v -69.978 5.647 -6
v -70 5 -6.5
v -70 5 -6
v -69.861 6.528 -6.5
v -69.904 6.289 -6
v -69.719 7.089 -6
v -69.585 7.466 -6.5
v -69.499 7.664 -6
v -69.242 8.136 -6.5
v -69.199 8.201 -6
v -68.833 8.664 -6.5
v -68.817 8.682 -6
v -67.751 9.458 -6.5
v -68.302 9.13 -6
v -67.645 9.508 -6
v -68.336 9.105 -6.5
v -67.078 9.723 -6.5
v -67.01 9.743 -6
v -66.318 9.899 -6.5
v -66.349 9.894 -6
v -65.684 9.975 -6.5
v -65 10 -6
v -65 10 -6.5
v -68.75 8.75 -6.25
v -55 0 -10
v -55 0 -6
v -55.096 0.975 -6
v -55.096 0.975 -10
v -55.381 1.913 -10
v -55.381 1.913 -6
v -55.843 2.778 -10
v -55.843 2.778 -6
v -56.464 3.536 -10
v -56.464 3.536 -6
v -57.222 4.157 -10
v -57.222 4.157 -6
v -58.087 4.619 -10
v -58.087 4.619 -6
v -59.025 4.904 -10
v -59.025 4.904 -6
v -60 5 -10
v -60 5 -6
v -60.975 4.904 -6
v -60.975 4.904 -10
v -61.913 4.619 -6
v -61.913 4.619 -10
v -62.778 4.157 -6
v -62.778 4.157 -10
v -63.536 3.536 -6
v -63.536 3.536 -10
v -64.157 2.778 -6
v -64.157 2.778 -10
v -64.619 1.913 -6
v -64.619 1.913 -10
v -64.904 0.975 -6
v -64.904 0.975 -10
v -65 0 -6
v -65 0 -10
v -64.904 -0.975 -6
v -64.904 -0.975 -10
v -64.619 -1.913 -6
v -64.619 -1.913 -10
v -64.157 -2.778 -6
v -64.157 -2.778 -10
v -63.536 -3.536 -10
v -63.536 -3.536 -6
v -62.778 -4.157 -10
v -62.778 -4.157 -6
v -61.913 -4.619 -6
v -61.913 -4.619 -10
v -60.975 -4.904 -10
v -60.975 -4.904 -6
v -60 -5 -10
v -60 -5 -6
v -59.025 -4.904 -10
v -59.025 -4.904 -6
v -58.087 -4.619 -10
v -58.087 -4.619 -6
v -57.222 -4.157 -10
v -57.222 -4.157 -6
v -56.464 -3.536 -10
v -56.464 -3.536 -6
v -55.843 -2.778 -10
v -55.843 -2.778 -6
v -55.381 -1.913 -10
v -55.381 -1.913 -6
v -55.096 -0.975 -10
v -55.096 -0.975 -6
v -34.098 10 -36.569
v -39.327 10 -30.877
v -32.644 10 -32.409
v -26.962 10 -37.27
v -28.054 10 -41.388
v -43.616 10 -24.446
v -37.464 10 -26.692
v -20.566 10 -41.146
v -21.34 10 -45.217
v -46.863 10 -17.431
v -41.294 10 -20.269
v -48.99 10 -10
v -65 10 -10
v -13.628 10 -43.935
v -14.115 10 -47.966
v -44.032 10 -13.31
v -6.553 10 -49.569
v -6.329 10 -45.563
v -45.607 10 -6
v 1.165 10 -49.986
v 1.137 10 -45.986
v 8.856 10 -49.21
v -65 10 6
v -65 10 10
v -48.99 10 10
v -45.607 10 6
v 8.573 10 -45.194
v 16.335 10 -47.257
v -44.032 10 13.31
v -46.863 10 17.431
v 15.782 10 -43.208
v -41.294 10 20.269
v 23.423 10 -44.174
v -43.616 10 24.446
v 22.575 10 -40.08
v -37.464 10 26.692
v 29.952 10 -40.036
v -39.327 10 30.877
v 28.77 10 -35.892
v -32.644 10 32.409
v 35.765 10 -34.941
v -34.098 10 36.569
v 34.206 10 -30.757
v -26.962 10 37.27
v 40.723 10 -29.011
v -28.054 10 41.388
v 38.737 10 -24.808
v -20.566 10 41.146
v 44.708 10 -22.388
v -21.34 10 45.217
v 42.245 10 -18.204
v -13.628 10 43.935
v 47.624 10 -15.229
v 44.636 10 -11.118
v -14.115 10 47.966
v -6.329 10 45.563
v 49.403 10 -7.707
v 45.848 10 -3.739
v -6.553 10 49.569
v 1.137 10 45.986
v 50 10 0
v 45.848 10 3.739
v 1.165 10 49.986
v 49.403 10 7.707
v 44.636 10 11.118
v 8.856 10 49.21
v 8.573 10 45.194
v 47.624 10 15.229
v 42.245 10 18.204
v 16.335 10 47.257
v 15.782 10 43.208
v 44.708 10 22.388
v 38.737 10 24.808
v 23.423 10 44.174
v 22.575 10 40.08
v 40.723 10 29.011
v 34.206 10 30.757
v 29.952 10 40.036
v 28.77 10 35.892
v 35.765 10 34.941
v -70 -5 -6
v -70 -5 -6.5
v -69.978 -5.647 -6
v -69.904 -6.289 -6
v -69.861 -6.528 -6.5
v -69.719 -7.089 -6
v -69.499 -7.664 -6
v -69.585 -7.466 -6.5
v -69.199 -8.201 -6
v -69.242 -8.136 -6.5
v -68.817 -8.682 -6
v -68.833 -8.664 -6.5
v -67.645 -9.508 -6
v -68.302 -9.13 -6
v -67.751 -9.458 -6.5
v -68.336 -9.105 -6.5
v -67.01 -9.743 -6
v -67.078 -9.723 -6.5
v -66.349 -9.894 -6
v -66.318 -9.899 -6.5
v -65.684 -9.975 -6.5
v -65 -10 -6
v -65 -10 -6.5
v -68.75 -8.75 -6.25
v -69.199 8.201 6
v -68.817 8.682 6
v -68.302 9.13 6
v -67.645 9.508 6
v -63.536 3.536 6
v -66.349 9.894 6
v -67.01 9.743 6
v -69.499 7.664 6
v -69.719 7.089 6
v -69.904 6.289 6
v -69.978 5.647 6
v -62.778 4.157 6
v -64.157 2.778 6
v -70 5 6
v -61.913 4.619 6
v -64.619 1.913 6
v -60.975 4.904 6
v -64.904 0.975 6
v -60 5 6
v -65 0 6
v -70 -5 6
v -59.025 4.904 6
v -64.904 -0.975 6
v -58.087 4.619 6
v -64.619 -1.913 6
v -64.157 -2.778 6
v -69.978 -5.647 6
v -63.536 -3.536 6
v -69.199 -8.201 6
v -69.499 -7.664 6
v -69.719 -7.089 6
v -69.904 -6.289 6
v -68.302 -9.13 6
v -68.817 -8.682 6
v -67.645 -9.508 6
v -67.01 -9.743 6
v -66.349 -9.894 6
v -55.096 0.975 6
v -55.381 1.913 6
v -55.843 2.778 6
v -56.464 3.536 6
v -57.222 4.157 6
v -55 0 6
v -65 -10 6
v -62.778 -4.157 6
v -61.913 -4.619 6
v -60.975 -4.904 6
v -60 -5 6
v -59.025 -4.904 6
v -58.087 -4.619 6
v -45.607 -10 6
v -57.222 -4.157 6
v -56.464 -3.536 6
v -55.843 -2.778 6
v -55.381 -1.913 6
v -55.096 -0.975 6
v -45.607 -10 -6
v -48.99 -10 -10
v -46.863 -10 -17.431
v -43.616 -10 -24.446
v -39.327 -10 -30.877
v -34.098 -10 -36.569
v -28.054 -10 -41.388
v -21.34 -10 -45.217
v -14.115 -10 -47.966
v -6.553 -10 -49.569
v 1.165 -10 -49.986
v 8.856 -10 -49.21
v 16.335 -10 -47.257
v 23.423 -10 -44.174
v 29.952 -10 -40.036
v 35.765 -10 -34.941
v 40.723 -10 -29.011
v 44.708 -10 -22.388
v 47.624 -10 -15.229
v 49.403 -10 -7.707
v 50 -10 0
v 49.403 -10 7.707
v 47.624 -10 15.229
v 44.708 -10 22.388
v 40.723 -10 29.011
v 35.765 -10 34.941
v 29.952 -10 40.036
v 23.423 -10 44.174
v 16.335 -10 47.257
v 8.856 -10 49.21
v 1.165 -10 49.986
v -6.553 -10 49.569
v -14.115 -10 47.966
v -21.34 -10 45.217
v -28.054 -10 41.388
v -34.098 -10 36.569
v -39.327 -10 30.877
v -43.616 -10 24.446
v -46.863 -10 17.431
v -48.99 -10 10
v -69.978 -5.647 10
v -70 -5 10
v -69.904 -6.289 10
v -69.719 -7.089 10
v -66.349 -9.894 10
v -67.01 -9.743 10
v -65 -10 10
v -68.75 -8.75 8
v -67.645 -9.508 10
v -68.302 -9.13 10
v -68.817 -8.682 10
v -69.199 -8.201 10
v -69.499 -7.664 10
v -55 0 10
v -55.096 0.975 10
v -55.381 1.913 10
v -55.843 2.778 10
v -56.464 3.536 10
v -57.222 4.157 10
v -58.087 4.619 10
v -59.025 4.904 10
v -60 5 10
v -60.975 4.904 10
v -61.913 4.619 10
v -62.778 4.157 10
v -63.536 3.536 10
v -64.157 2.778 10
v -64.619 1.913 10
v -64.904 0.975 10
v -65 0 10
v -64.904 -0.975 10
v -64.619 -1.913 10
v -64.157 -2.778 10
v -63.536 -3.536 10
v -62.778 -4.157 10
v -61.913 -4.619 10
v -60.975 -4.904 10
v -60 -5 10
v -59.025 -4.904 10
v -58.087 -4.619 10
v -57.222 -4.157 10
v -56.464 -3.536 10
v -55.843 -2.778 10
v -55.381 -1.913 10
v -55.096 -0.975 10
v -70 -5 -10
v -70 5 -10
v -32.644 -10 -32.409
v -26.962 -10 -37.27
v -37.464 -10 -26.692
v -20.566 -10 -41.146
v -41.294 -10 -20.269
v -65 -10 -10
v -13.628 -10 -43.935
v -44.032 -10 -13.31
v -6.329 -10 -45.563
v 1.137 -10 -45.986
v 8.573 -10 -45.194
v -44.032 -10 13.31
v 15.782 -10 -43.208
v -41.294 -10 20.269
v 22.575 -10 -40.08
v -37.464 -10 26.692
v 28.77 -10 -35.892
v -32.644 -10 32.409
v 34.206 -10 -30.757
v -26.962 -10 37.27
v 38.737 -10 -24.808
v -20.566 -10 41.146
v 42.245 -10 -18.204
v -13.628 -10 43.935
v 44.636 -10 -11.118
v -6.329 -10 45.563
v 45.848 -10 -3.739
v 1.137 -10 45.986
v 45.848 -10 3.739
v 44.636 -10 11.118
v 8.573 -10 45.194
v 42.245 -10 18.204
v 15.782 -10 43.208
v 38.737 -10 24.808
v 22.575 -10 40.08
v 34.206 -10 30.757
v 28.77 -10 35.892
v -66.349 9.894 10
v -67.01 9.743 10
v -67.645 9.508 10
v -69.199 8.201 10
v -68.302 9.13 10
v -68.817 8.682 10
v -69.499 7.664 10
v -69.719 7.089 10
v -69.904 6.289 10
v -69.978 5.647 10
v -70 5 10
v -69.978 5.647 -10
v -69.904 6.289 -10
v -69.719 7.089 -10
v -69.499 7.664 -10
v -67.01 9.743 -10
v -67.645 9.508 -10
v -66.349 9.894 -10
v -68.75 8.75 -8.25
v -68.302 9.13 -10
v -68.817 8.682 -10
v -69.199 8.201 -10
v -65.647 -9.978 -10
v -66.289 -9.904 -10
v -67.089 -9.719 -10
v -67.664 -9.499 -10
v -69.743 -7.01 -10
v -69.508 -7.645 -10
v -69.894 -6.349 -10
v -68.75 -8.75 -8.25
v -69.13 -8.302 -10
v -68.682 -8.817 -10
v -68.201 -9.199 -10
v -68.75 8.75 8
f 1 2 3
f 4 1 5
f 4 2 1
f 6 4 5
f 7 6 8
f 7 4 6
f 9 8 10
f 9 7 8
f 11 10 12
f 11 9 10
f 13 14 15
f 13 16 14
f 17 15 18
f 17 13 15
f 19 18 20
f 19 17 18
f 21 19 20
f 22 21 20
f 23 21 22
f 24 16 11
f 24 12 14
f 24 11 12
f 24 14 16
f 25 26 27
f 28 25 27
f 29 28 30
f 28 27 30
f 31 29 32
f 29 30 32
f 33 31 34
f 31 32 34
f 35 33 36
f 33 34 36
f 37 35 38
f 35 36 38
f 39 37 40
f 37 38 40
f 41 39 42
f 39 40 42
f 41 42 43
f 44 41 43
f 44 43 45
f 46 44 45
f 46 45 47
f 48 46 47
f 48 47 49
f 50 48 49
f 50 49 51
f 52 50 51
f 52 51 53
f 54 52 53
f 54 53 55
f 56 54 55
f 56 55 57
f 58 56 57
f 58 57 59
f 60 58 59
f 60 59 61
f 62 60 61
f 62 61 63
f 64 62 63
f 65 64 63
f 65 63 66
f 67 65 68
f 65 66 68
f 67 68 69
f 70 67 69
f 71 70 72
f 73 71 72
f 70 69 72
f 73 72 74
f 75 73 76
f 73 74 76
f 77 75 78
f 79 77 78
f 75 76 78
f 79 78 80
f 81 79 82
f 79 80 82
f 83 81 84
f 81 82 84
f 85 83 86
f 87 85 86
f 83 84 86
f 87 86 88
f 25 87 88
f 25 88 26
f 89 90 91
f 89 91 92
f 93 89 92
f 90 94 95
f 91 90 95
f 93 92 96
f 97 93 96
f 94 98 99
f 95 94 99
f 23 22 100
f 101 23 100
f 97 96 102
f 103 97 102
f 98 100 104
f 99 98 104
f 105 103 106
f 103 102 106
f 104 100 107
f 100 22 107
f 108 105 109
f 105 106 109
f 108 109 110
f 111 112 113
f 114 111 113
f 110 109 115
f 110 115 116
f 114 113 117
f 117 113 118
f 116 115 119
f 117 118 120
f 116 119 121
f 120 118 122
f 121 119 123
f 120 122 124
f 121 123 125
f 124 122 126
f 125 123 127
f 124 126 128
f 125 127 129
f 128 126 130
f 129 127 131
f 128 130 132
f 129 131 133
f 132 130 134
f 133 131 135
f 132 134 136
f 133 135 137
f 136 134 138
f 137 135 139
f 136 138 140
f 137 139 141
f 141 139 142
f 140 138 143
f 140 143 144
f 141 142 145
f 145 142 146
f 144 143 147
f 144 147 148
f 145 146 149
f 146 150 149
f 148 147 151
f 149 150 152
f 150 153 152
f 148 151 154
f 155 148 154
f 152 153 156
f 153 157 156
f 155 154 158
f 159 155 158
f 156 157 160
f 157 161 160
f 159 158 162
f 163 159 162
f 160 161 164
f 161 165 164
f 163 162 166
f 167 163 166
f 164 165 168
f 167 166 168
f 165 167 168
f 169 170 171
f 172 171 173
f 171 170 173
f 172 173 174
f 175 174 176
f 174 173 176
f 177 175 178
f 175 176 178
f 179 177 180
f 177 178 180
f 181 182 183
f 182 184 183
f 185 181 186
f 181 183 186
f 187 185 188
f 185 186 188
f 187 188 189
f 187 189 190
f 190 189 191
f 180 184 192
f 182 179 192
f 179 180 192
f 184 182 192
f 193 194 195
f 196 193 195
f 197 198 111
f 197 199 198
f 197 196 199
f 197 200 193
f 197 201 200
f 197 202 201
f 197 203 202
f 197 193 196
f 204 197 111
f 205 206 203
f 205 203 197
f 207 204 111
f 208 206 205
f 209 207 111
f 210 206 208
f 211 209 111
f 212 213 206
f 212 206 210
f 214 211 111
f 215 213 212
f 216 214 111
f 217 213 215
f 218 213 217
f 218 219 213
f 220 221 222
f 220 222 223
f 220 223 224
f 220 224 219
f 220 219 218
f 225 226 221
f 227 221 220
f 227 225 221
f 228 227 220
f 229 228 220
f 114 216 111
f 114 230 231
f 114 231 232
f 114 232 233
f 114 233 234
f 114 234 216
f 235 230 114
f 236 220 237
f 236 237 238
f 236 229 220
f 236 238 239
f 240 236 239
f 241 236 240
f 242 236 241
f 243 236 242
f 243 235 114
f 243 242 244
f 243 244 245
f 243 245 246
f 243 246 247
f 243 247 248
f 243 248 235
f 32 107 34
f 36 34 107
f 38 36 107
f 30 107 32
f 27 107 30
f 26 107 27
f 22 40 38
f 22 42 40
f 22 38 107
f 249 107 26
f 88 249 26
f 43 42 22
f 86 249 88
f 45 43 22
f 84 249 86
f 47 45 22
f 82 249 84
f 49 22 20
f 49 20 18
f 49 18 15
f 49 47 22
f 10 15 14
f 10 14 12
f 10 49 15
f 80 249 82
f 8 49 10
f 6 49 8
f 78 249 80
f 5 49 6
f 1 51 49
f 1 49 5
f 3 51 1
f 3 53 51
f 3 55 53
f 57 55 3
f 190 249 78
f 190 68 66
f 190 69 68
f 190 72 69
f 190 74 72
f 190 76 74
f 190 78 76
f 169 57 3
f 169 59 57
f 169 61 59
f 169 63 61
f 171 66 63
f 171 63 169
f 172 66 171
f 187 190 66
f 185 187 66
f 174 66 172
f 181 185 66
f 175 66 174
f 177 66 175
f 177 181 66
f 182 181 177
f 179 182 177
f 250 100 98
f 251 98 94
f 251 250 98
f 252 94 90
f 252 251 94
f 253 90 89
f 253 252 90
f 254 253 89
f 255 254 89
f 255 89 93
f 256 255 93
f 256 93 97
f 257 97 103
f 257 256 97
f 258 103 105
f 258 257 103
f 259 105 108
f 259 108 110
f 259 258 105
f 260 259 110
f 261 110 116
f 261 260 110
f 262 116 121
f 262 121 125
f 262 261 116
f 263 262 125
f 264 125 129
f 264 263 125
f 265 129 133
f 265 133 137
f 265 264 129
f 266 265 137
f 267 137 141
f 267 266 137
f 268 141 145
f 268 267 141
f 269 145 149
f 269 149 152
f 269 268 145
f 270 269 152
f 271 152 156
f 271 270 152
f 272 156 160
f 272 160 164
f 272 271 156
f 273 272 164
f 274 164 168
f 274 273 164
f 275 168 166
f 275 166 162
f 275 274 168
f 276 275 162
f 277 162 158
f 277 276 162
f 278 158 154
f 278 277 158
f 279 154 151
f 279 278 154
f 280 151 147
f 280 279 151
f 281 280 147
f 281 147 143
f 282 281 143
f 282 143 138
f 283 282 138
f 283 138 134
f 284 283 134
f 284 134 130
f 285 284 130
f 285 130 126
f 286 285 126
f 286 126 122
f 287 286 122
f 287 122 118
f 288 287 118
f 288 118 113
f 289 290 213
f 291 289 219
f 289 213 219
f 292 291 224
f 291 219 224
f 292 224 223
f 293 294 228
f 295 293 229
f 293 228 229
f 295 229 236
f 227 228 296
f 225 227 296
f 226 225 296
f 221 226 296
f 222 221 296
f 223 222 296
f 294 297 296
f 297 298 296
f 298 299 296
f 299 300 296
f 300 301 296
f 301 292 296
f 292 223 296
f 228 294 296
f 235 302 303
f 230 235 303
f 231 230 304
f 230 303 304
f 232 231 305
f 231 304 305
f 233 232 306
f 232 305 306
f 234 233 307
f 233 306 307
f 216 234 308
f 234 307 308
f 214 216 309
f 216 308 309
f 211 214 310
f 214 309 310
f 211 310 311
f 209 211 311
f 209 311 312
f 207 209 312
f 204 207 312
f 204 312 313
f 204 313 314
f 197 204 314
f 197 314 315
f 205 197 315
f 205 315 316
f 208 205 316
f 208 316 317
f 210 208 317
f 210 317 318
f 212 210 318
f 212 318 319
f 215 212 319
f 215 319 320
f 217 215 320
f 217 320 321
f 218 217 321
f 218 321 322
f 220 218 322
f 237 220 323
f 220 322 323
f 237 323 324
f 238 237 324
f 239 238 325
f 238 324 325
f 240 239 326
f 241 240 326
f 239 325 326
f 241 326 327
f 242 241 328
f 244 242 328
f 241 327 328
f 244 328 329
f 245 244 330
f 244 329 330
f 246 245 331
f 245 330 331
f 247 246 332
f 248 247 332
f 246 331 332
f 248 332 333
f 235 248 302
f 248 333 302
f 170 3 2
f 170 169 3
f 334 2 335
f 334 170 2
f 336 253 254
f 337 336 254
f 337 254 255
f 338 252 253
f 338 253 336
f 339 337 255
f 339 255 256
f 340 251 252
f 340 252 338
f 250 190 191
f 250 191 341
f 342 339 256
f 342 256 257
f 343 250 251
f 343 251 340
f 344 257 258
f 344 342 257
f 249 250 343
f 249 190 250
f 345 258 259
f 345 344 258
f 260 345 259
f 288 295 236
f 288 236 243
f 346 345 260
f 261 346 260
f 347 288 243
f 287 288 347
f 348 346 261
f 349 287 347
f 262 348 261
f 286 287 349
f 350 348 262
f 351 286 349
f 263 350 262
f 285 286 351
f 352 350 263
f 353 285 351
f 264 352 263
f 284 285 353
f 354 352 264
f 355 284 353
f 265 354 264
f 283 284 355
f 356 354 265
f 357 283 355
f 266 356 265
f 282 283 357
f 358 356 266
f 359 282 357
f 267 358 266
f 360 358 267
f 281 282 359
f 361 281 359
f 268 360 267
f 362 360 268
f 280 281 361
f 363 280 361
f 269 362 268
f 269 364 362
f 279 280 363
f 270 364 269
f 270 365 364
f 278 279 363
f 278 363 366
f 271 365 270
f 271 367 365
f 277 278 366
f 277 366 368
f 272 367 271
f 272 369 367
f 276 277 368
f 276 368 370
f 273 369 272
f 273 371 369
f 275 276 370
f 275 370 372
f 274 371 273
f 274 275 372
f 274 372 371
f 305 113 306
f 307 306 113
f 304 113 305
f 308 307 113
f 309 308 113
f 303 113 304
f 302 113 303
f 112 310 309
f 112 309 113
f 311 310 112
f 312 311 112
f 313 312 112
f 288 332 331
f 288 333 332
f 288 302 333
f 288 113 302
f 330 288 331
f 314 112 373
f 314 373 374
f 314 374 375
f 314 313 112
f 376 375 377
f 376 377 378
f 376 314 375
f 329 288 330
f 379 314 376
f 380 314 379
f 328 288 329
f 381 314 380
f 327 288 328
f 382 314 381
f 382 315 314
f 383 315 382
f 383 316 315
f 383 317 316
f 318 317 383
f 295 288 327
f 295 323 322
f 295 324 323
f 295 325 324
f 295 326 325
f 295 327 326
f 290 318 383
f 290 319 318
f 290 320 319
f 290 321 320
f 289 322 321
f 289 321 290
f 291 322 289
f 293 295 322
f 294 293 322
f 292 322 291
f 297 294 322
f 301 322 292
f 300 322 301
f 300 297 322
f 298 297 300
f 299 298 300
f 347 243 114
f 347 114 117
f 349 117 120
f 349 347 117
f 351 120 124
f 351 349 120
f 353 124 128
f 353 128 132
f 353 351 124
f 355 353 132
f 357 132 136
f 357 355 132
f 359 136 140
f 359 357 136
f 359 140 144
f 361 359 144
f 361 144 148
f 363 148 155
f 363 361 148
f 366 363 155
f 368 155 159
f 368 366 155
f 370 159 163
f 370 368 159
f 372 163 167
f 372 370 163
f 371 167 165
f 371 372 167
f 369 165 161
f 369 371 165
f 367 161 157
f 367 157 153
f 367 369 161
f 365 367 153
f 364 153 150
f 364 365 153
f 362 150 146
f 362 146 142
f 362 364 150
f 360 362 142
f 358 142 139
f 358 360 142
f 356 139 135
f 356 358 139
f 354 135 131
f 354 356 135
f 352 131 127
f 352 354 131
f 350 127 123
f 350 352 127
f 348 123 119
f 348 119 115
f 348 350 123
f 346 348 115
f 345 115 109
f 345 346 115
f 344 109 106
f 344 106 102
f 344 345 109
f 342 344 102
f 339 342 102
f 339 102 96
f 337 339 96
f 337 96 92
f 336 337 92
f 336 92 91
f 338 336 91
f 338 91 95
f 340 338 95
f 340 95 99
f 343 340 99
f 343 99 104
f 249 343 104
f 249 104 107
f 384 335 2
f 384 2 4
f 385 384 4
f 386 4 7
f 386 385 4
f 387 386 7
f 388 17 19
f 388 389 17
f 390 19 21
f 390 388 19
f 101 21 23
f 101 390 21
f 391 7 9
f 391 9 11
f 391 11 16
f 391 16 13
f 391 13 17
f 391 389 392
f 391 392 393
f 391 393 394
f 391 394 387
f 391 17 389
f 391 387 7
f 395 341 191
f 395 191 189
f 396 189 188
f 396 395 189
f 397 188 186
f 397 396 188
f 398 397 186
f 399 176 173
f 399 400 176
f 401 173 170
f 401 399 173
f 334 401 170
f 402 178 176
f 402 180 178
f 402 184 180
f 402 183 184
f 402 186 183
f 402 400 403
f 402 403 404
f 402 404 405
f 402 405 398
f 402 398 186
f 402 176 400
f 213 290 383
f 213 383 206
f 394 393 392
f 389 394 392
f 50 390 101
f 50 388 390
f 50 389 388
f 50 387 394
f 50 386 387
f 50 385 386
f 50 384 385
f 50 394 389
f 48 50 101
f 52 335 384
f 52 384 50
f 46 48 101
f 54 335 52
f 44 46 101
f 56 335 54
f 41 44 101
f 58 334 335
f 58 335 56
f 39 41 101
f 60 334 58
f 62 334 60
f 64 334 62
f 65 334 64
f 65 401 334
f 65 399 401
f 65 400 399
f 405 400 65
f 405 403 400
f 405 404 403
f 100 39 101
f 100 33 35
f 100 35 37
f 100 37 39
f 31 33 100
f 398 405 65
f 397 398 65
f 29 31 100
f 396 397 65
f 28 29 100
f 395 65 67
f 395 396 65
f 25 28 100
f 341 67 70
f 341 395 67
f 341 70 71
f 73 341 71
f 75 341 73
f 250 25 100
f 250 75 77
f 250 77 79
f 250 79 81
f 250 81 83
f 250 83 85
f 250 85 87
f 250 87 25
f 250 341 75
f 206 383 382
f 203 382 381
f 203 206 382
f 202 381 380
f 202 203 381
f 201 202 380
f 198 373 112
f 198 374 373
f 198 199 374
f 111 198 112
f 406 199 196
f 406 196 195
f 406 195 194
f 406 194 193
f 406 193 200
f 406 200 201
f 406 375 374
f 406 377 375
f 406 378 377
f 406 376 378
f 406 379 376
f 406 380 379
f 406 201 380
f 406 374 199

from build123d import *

# Parameters (mm, degrees)
F1_DEPTH    = 10
F2_T1_DEPTH = 29
F2_T3_DEPTH = 29
F3_R        = 5
F4_DEPTH    = 25.4


# Not quite as in the source:
# - a fillet or chamfer that OpenCascade refuses, or shapes differently, is made with other operations: its cross-section is extruded or revolved along the edge and cut away or added


with BuildPart() as f1:
    # F0 (on Front) → F1 (new body, symmetric)
    with BuildSketch(Plane.XZ):
        with BuildLine():
            Line((-70, -10), (-48.9897948557, -10))
            ThreePointArc((-48.9897948557, -10), (50, 0), (-48.9897948557, 10))
            Line((-48.9897948557, 10), (-70, 10))
            Line((-70, 10), (-70, 6))
            Line((-70, 6), (-45.607017004, 6))
            ThreePointArc((-45.607017004, 6), (46, 0), (-45.607017004, -6))
            Line((-45.607017004, -6), (-70, -6))
            Line((-70, -6), (-70, -10))
        make_face()
    extrude(amount=F1_DEPTH, both=True)

    # F2: fillet of radius 5 on 4 edges, made by hand

    # F2_s2 → F2_t1 (cut)
    with BuildSketch(Plane.XY.offset(-6.5)):
        with BuildLine():
            add(Edge.make_bspline(
                [(-70, 5), (-70, 10), (-65, 10)],
                knots=[0, 0, 0, 1, 1, 1], degree=2, weights=[1, 1, 1]))
            Line((-65, 10), (-70, 10))
            Line((-70, 10), (-70, 5))
        make_face()
        with BuildLine():
            add(Edge.make_bspline(
                [(-70, -5), (-70, -10), (-65, -10)],
                knots=[0, 0, 0, 1, 1, 1], degree=2, weights=[1, 1, 1]))
            Line((-65, -10), (-70, -10))
            Line((-70, -10), (-70, -5))
        make_face()
    extrude(amount=F2_T1_DEPTH, mode=Mode.SUBTRACT)

    # F2_s4 → F2_t3 (cut)
    with BuildSketch(Plane.XY.offset(-22.5)):
        with BuildLine():
            add(Edge.make_bspline(
                [(-70, 5), (-70, 10), (-65, 10)],
                knots=[0, 0, 0, 1, 1, 1], degree=2, weights=[1, 1, 1]))
            Line((-65, 10), (-70, 10))
            Line((-70, 10), (-70, 5))
        make_face()
        with BuildLine():
            add(Edge.make_bspline(
                [(-65, -10), (-70, -10), (-70, -5)],
                knots=[0, 0, 0, 1, 1, 1], degree=2, weights=[1, 1, 1]))
            Line((-70, -5), (-70, -10))
            Line((-70, -10), (-65, -10))
        make_face()
    extrude(amount=F2_T3_DEPTH, mode=Mode.SUBTRACT)

    # F3 (on face) → F4 (cut)
    with BuildSketch(Plane.XY.offset(10)):
        with Locations((-60, 0)):
            Circle(F3_R)
    extrude(amount=-F4_DEPTH, mode=Mode.SUBTRACT)


solid = f1.part
